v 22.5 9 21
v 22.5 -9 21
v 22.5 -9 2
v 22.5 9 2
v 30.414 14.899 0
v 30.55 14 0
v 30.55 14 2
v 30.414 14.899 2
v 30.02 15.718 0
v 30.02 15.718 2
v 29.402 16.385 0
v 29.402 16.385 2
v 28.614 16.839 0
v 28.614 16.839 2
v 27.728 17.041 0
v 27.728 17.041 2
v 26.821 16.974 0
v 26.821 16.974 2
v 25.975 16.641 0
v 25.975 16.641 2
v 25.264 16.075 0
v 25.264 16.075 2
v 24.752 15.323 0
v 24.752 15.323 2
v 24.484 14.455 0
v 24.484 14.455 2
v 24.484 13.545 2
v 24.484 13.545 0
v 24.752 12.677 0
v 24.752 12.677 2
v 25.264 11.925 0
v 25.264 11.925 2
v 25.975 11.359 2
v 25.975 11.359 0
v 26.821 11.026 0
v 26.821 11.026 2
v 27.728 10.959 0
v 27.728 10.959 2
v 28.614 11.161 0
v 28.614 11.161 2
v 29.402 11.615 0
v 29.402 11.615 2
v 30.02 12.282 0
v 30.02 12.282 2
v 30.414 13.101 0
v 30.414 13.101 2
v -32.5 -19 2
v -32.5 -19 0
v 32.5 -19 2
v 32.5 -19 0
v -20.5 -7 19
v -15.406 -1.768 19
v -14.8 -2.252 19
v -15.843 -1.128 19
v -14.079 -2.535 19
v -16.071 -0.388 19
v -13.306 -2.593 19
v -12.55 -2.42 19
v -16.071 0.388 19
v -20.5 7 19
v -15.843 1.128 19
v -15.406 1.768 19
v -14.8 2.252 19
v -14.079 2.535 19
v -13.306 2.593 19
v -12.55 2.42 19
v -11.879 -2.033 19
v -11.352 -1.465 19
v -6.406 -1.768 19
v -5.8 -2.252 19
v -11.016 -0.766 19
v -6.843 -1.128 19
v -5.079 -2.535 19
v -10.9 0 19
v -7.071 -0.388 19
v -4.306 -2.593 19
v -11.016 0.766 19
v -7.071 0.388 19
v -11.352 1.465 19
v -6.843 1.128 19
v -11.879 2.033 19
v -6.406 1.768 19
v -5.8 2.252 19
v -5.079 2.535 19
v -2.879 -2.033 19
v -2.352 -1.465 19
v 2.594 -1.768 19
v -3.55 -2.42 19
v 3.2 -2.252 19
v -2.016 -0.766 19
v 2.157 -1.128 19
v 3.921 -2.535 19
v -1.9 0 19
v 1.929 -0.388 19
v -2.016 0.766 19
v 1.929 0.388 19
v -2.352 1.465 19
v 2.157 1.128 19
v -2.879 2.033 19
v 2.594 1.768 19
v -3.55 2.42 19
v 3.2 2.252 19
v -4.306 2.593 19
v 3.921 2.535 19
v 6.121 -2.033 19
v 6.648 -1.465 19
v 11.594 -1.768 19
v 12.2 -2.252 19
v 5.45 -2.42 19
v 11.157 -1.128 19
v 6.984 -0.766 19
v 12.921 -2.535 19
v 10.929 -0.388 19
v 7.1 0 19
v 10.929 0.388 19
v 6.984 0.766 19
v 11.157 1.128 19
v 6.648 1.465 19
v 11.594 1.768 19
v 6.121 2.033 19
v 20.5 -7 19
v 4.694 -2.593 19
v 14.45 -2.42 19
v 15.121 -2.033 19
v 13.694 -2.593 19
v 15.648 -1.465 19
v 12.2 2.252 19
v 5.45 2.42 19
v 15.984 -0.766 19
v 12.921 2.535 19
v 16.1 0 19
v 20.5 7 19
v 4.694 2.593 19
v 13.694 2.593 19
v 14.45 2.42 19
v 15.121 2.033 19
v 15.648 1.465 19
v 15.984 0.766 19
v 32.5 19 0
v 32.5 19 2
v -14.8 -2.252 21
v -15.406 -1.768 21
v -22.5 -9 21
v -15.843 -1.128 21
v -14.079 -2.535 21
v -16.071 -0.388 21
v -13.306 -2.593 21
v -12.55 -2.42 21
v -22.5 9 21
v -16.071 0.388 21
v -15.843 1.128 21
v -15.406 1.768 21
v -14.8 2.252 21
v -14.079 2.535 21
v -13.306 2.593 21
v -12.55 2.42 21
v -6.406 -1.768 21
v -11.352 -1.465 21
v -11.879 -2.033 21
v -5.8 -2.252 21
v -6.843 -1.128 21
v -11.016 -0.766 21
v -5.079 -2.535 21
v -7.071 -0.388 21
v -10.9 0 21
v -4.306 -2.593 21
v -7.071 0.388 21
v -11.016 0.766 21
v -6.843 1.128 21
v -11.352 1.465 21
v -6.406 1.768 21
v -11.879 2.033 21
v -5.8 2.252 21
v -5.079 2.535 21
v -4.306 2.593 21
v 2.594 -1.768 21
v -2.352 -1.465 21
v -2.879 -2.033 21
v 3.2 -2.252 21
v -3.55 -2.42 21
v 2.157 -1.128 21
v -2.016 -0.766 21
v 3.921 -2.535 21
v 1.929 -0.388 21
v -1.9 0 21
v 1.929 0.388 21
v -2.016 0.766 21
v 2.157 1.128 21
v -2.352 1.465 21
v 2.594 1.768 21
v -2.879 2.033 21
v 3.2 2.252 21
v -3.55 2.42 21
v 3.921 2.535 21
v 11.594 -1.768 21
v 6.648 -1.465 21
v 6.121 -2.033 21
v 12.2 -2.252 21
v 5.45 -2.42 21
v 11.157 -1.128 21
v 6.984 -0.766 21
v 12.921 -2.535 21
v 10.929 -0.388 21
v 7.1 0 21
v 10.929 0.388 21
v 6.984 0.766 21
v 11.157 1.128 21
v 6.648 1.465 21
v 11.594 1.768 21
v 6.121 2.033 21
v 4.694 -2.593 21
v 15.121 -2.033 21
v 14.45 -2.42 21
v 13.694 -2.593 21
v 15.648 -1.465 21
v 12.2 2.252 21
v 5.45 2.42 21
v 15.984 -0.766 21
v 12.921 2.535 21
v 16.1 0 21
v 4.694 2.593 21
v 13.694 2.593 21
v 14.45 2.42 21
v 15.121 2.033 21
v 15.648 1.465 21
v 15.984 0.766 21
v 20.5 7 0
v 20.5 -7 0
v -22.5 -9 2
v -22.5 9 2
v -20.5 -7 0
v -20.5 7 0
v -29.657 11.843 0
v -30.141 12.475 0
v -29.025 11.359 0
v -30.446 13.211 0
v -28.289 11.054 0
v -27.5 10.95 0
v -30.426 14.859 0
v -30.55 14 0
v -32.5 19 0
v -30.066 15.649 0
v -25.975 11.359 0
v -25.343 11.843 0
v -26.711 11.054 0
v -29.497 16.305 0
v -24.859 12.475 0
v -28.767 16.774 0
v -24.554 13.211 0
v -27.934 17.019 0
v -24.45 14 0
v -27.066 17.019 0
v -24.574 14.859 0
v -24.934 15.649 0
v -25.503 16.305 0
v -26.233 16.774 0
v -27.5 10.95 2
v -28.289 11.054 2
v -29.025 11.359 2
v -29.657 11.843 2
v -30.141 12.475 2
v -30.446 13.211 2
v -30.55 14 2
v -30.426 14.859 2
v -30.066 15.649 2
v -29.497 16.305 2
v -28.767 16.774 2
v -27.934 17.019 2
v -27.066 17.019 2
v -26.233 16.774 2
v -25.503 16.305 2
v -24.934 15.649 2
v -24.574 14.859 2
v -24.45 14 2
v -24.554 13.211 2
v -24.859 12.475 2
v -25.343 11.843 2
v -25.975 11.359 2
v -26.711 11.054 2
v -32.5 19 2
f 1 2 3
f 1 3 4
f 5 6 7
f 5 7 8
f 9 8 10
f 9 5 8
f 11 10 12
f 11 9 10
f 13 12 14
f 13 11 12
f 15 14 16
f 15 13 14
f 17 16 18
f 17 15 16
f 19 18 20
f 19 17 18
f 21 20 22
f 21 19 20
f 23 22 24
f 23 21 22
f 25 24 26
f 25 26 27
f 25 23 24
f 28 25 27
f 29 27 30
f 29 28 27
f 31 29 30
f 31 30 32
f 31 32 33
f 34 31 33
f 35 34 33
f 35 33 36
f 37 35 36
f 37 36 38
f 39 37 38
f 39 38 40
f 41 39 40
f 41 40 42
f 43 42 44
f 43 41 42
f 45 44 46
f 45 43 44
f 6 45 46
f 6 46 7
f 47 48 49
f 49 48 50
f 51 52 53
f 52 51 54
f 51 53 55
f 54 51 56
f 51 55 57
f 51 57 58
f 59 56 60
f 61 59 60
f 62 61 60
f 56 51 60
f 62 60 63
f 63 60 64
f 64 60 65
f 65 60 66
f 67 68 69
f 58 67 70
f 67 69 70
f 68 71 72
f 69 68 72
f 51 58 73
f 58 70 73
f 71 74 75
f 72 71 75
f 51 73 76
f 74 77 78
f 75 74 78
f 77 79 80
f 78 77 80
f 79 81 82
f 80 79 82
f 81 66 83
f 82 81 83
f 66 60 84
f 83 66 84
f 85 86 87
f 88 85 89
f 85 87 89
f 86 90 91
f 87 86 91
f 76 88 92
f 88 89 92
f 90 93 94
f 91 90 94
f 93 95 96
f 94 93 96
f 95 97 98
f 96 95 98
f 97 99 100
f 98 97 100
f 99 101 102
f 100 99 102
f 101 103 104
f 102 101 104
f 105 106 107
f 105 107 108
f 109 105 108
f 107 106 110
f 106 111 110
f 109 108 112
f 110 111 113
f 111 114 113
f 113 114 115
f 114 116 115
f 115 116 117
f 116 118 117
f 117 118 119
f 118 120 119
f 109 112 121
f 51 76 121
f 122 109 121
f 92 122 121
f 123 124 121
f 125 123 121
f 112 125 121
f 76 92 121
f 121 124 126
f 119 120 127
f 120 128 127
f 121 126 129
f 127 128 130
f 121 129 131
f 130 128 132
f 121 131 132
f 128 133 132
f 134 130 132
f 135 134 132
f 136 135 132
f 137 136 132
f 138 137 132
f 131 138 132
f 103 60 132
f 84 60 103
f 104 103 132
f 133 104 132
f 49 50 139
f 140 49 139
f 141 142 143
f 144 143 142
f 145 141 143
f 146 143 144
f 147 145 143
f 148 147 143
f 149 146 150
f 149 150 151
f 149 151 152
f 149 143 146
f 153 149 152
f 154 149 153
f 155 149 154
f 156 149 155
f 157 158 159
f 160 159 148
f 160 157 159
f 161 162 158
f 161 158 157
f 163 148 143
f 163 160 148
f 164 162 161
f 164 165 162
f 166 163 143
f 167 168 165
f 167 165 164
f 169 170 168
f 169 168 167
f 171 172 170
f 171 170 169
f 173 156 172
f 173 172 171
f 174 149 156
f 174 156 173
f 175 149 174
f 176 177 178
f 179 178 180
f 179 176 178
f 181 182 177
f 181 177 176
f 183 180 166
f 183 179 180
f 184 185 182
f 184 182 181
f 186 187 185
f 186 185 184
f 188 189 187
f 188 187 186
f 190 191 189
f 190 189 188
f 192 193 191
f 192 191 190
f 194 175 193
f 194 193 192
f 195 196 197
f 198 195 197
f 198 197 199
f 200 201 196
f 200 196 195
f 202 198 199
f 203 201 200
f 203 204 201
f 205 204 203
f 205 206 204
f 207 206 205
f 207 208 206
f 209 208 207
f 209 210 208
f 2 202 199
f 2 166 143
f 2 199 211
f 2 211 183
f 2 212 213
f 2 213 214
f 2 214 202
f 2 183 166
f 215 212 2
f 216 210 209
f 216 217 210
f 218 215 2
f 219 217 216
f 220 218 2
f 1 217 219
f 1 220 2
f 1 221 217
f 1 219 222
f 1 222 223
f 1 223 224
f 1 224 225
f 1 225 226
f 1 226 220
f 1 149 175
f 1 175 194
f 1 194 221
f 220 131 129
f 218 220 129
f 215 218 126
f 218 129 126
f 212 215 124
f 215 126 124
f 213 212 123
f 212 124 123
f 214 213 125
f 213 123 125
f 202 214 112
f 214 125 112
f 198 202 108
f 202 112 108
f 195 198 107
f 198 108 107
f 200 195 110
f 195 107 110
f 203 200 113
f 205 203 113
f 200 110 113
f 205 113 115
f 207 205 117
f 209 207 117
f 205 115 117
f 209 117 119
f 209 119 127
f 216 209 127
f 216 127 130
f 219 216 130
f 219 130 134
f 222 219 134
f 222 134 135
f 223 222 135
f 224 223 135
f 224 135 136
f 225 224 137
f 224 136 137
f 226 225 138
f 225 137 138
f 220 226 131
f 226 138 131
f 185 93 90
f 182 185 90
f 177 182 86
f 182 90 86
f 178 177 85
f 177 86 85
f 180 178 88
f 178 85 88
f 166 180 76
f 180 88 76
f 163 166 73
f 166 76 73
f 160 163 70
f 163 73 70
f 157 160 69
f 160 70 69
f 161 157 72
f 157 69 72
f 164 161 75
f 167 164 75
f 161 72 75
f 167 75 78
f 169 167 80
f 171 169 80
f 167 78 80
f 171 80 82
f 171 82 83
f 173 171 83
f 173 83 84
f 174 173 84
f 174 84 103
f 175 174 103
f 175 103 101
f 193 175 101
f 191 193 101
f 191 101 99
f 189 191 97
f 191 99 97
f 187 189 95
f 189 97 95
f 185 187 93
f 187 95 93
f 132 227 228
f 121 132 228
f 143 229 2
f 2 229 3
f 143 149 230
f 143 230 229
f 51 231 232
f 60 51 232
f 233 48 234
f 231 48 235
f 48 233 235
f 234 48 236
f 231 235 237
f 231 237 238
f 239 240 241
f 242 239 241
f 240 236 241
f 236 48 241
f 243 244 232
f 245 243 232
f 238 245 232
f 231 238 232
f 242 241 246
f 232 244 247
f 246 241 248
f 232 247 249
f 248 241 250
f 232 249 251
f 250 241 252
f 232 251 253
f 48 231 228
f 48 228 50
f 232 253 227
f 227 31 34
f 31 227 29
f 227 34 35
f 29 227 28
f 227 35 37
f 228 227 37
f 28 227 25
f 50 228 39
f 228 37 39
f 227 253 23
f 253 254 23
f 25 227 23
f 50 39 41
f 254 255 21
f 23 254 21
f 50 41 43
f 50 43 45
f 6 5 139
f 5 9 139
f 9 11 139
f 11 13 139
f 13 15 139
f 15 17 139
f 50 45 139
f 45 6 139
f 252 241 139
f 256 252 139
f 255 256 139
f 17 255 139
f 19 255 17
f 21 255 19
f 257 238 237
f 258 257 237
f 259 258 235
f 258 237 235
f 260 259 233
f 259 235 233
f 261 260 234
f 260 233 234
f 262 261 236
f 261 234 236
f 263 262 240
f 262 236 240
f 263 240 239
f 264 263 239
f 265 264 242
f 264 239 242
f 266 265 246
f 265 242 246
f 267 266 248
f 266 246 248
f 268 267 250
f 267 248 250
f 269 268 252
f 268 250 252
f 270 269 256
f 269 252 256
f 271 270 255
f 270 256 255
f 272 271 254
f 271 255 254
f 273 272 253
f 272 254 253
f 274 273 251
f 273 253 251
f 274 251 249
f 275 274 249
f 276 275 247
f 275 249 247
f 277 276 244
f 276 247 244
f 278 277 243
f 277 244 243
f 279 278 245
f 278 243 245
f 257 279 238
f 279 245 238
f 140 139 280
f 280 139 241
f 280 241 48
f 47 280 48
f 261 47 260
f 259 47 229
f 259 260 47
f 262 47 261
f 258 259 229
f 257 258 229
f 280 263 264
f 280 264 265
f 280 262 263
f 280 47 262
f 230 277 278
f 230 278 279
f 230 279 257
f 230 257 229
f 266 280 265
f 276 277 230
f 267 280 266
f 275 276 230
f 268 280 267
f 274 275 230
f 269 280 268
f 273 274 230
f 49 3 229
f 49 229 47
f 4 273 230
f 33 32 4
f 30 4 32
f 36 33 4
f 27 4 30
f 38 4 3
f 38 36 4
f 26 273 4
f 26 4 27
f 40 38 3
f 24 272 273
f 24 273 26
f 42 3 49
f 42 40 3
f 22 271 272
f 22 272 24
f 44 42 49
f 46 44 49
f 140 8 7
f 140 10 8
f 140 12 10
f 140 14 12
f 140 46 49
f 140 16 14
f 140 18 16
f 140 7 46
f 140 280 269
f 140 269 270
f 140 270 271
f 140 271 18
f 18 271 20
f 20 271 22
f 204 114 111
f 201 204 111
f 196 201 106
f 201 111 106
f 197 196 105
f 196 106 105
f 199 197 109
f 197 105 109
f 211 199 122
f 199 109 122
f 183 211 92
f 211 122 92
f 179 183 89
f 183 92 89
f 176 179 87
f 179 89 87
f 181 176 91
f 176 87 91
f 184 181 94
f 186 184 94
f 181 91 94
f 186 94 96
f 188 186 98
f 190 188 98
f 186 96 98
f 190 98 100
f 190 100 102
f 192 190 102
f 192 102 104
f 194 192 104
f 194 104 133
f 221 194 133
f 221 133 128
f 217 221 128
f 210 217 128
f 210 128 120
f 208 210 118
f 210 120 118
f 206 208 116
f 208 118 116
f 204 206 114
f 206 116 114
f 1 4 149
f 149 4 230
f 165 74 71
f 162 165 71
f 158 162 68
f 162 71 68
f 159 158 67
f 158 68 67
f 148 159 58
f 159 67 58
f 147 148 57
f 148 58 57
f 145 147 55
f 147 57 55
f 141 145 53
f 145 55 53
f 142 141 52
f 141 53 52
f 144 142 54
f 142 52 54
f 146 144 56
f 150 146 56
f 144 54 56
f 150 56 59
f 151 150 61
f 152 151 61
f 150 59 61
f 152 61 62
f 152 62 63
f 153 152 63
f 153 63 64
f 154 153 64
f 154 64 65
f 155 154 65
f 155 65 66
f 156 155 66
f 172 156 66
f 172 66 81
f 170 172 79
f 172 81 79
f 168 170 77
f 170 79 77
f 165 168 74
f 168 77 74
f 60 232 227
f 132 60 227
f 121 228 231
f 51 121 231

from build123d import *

# Parameters (mm, degrees)
F1_DEPTH = 21
F2_START = 19
F2_DEPTH = 2
F0_R     = 3.05
F3_DEPTH = 2


with BuildPart() as f1:
    # F0 (on Top) → F1 (new body)
    with BuildSketch(Plane.XY):
        Polygon((22.5, -9), (22.5, 0), (20.5, 0), (20.5, -7), (-20.5, -7), (-20.5, 0), (-22.5, 0), (-22.5, -9), align=None)
        Polygon((22.5, 0), (22.5, 9), (-22.5, 9), (-22.5, 0), (-20.5, 0), (-20.5, 7), (20.5, 7), (20.5, 0), align=None)
    extrude(amount=F1_DEPTH)

    # F0 (on Top) → F2 (join)
    with BuildSketch(Plane.XY.offset(F2_START)):
        with BuildLine():
            Line((16.1, 0), (20.5, 0))
            Line((20.5, 0), (20.5, 7))
            Line((20.5, 7), (-20.5, 7))
            Line((-20.5, 7), (-20.5, 0))
            Line((-20.5, 0), (-16.1, 0))
            ThreePointArc((-16.1, 0), (-13.5, 2.6), (-10.9, 0))
            Line((-10.9, 0), (-7.1, 0))
            ThreePointArc((-7.1, 0), (-4.5, 2.6), (-1.9, 0))
            Line((-1.9, 0), (1.9, 0))
            ThreePointArc((1.9, 0), (4.5, 2.6), (7.1, 0))
            Line((7.1, 0), (10.9, 0))
            ThreePointArc((10.9, 0), (13.5, 2.6), (16.1, 0))
        make_face()
        with BuildLine():
            Line((20.5, -7), (20.5, 0))
            Line((20.5, 0), (16.1, 0))
            ThreePointArc((16.1, 0), (13.5, -2.6), (10.9, 0))
            Line((10.9, 0), (7.1, 0))
            ThreePointArc((7.1, 0), (4.5, -2.6), (1.9, 0))
            Line((1.9, 0), (-1.9, 0))
            ThreePointArc((-1.9, 0), (-4.5, -2.6), (-7.1, 0))
            Line((-7.1, 0), (-10.9, 0))
            ThreePointArc((-10.9, 0), (-13.5, -2.6), (-16.1, 0))
            Line((-16.1, 0), (-20.5, 0))
            Line((-20.5, 0), (-20.5, -7))
            Line((-20.5, -7), (20.5, -7))
        make_face()
    extrude(amount=F2_DEPTH)

    # F0 (on Top) → F3 (join)
    with BuildSketch(Plane.XY):
        Polygon((-32.5, 19), (-32.5, 14), (-32.5, -19), (32.5, -19), (32.5, 19), align=None)
        with BuildLine():
            ThreePointArc((-24.45, 14), (-25.3433243174, 11.8433243174), (-27.5, 10.95))
            ThreePointArc((-27.5, 10.95), (-29.6566756826, 11.8433243174), (-30.55, 14))
            ThreePointArc((-30.55, 14), (-27.5, 17.05), (-24.45, 14))
        make_face(mode=Mode.SUBTRACT)
        Polygon((-22.5, 9), (22.5, 9), (22.5, 0), (22.5, -9), (-22.5, -9), (-22.5, 0), align=None, mode=Mode.SUBTRACT)
        with Locations((27.5, 14)):
            Circle(F0_R, mode=Mode.SUBTRACT)
    extrude(amount=F3_DEPTH)


solid = f1.part
